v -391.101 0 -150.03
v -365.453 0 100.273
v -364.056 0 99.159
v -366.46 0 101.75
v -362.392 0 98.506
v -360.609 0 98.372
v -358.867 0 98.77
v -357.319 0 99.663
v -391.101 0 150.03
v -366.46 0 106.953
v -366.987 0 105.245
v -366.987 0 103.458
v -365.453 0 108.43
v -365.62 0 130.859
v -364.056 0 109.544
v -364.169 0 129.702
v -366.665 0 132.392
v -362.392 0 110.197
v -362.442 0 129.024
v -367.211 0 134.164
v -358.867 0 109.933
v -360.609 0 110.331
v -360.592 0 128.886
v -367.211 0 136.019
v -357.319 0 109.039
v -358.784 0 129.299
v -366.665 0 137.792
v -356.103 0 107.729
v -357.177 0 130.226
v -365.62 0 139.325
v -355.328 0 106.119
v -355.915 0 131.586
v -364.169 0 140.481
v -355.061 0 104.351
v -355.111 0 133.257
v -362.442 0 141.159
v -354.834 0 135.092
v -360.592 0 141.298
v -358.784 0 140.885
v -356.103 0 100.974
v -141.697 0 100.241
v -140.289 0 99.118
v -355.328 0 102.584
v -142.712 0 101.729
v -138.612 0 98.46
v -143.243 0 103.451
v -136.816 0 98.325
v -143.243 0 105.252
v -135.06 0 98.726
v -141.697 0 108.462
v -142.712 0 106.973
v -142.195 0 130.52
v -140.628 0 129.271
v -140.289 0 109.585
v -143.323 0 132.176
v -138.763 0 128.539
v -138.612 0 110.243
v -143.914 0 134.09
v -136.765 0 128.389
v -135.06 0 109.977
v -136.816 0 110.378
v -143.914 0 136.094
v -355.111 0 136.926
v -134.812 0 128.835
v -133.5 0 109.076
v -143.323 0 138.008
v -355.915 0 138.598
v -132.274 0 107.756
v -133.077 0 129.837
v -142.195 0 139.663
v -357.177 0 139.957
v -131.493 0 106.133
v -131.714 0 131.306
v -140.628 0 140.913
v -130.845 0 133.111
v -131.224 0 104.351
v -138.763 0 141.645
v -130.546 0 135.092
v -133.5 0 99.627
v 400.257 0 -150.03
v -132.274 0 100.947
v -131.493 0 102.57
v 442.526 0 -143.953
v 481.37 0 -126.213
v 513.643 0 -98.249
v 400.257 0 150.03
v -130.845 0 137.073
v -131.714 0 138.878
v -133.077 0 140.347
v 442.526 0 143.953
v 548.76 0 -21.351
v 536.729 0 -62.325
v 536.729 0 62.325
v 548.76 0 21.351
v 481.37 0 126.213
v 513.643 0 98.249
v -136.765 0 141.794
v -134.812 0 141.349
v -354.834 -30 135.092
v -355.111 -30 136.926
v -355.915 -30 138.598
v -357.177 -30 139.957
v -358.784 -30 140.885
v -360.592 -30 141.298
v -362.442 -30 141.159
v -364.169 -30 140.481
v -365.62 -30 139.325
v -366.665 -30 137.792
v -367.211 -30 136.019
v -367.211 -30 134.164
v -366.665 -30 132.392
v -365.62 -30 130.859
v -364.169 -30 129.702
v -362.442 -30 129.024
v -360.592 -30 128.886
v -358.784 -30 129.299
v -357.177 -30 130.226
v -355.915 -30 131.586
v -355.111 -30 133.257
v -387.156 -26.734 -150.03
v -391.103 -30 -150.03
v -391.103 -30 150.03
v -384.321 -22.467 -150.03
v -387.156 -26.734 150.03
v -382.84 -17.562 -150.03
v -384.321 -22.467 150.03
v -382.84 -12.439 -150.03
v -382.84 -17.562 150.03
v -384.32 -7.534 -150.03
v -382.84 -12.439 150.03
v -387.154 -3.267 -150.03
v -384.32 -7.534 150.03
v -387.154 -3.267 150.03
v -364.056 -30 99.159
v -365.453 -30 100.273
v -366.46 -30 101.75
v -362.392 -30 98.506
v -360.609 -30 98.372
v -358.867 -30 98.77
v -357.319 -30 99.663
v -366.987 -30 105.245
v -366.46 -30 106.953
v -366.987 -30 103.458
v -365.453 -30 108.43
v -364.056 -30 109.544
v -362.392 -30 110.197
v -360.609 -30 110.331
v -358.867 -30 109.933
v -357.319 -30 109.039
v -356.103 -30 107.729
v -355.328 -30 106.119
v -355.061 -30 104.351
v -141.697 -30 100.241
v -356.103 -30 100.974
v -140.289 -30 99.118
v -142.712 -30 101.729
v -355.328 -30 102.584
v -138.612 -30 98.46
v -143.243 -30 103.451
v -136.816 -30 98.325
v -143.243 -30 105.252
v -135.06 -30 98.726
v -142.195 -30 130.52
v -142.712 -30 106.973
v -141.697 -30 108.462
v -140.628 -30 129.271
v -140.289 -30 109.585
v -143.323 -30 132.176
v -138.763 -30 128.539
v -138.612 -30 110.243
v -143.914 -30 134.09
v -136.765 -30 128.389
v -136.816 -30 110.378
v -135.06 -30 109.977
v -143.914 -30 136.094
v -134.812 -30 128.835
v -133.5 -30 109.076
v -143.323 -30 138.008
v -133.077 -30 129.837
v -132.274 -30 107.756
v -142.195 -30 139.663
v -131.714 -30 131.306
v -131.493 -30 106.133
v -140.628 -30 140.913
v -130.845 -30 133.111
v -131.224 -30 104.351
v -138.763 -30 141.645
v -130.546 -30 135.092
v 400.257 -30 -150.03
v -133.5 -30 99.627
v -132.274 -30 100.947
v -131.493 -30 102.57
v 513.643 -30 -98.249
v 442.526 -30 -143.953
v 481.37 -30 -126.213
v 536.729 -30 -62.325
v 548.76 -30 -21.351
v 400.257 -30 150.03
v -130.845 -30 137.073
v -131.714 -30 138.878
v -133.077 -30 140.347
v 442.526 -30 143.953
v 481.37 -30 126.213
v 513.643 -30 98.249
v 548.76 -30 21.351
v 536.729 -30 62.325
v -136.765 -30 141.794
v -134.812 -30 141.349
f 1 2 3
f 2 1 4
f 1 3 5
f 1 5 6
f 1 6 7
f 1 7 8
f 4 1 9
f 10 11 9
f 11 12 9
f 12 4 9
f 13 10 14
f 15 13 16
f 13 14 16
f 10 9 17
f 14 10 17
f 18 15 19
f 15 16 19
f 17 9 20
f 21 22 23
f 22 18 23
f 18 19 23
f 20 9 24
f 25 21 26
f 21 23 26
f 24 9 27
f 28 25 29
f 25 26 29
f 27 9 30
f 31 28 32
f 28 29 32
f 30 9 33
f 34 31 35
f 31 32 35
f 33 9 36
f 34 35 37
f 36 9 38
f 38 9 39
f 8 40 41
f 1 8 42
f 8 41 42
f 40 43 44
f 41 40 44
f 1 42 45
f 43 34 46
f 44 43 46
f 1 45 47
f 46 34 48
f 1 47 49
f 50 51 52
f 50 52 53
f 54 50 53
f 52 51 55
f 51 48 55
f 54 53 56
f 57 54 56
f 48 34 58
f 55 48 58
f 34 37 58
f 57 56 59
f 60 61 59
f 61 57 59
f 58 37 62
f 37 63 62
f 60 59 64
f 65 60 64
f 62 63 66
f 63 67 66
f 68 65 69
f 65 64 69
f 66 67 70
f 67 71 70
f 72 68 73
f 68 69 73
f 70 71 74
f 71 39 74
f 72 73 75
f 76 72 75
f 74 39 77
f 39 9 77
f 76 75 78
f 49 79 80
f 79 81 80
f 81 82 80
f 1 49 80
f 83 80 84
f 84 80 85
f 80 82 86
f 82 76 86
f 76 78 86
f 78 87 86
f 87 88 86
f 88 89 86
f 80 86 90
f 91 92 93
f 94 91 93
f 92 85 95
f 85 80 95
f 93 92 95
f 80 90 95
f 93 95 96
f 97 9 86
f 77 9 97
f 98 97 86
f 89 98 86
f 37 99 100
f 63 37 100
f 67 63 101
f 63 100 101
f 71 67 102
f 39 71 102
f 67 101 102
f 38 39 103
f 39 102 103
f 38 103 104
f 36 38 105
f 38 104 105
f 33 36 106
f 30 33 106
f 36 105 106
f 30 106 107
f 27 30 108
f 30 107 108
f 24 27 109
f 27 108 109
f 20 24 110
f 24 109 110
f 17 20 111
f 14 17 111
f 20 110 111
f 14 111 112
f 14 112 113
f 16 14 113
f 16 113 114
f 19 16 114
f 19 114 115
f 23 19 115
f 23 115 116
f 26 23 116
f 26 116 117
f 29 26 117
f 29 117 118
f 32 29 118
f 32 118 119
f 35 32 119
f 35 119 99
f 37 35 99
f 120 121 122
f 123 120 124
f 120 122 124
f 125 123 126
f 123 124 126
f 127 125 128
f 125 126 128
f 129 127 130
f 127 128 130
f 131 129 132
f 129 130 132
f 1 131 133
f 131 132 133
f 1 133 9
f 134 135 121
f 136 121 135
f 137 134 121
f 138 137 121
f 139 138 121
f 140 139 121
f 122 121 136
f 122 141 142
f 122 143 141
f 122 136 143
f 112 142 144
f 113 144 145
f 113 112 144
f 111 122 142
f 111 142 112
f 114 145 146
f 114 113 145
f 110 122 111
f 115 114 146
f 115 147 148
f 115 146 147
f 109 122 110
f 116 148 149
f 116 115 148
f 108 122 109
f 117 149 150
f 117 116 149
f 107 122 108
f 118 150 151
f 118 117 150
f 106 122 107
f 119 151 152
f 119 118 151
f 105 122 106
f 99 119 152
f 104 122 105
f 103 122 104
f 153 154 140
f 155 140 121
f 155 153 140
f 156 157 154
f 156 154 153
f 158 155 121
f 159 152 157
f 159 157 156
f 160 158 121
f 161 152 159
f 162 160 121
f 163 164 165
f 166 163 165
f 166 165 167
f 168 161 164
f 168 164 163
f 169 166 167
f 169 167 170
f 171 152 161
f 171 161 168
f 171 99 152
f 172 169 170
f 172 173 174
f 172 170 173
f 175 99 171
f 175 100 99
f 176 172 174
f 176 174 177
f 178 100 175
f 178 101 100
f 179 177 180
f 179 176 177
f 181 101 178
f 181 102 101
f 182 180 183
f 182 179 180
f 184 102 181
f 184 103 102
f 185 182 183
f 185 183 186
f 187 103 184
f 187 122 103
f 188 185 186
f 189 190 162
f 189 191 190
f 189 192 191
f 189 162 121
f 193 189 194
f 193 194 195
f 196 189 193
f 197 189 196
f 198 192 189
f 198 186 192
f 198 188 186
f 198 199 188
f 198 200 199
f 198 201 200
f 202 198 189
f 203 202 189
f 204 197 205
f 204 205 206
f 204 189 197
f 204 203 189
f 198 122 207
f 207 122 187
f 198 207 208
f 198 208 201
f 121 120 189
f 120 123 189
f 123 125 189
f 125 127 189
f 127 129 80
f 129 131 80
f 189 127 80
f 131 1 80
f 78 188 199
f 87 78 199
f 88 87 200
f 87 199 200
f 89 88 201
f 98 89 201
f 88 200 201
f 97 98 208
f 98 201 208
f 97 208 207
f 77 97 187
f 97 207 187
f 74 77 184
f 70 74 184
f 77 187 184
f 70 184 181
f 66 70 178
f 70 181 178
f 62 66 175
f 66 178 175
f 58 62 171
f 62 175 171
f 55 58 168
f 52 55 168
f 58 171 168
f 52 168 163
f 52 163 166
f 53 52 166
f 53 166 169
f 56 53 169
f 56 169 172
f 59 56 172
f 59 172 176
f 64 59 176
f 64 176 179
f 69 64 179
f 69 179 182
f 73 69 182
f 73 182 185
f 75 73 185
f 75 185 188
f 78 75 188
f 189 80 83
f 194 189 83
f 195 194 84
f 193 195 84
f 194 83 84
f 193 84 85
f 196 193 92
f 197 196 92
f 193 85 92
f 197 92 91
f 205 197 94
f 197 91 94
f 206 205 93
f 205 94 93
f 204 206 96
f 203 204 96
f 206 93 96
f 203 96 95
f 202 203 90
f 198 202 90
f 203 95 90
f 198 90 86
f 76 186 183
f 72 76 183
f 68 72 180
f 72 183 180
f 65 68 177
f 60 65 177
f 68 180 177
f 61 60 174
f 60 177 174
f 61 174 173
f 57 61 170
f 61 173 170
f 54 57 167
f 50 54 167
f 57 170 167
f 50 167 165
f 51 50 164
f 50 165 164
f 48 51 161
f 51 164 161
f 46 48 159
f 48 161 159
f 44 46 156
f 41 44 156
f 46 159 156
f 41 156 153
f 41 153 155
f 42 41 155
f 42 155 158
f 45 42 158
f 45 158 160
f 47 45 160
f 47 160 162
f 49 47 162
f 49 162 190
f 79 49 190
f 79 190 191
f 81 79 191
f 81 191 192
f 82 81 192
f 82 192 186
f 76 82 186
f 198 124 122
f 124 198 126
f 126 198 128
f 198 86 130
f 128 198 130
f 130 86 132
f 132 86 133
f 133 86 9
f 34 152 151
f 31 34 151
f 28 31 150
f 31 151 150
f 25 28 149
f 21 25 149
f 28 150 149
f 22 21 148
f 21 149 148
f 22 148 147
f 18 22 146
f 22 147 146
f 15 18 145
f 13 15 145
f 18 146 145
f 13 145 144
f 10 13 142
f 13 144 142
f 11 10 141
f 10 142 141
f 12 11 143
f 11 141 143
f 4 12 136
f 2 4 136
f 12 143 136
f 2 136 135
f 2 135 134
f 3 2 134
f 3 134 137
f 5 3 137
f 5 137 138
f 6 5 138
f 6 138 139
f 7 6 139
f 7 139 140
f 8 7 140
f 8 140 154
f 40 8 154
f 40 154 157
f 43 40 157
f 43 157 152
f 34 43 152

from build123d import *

# Parameters (mm, degrees)
F1_DEPTH = 30
F2_R     = 6.223398
F2_R_2   = 5.996206
F2_R_3   = 6.721343
F2_R_4   = 6.043049
F3_DEPTH = 35
F4_R     = 17.538538
F5_DEPTH = 500


with BuildPart() as f1:
    # F0 (on Front) → F1 (new body)
    with BuildSketch(Plane.XZ):
        with BuildLine():
            Line((-400.257468, -150.029927), (400.257468, -150.029927))
            ThreePointArc((400.257468, -150.029927), (550.287396, 0), (400.257468, 150.029927))
            Line((400.257468, 150.029927), (-400.257468, 150.029927))
            Line((-400.257468, 150.029927), (-400.257468, -150.029927))
        make_face()
    extrude(amount=F1_DEPTH)

    # F2 (on face) → F3 (cut)
    with BuildSketch(Plane.XZ.offset(30)):
        with Locations((-361.057468, 135.091782)):
            Circle(F2_R)
        with Locations((-361.057468, 104.35146)):
            Circle(F2_R_2)
        with Locations((-137.267468, 135.091782)):
            Circle(F2_R_3)
        with Locations((-137.267468, 104.35146)):
            Circle(F2_R_4)
    extrude(amount=-F3_DEPTH, mode=Mode.SUBTRACT)

    # F4 (on Top) → F5 (cut, symmetric)
    with BuildSketch(Plane.XY):
        with Locations((-400.190324, -14.999421)):
            Circle(F4_R)
    extrude(amount=F5_DEPTH, both=True, mode=Mode.SUBTRACT)


solid = f1.part
